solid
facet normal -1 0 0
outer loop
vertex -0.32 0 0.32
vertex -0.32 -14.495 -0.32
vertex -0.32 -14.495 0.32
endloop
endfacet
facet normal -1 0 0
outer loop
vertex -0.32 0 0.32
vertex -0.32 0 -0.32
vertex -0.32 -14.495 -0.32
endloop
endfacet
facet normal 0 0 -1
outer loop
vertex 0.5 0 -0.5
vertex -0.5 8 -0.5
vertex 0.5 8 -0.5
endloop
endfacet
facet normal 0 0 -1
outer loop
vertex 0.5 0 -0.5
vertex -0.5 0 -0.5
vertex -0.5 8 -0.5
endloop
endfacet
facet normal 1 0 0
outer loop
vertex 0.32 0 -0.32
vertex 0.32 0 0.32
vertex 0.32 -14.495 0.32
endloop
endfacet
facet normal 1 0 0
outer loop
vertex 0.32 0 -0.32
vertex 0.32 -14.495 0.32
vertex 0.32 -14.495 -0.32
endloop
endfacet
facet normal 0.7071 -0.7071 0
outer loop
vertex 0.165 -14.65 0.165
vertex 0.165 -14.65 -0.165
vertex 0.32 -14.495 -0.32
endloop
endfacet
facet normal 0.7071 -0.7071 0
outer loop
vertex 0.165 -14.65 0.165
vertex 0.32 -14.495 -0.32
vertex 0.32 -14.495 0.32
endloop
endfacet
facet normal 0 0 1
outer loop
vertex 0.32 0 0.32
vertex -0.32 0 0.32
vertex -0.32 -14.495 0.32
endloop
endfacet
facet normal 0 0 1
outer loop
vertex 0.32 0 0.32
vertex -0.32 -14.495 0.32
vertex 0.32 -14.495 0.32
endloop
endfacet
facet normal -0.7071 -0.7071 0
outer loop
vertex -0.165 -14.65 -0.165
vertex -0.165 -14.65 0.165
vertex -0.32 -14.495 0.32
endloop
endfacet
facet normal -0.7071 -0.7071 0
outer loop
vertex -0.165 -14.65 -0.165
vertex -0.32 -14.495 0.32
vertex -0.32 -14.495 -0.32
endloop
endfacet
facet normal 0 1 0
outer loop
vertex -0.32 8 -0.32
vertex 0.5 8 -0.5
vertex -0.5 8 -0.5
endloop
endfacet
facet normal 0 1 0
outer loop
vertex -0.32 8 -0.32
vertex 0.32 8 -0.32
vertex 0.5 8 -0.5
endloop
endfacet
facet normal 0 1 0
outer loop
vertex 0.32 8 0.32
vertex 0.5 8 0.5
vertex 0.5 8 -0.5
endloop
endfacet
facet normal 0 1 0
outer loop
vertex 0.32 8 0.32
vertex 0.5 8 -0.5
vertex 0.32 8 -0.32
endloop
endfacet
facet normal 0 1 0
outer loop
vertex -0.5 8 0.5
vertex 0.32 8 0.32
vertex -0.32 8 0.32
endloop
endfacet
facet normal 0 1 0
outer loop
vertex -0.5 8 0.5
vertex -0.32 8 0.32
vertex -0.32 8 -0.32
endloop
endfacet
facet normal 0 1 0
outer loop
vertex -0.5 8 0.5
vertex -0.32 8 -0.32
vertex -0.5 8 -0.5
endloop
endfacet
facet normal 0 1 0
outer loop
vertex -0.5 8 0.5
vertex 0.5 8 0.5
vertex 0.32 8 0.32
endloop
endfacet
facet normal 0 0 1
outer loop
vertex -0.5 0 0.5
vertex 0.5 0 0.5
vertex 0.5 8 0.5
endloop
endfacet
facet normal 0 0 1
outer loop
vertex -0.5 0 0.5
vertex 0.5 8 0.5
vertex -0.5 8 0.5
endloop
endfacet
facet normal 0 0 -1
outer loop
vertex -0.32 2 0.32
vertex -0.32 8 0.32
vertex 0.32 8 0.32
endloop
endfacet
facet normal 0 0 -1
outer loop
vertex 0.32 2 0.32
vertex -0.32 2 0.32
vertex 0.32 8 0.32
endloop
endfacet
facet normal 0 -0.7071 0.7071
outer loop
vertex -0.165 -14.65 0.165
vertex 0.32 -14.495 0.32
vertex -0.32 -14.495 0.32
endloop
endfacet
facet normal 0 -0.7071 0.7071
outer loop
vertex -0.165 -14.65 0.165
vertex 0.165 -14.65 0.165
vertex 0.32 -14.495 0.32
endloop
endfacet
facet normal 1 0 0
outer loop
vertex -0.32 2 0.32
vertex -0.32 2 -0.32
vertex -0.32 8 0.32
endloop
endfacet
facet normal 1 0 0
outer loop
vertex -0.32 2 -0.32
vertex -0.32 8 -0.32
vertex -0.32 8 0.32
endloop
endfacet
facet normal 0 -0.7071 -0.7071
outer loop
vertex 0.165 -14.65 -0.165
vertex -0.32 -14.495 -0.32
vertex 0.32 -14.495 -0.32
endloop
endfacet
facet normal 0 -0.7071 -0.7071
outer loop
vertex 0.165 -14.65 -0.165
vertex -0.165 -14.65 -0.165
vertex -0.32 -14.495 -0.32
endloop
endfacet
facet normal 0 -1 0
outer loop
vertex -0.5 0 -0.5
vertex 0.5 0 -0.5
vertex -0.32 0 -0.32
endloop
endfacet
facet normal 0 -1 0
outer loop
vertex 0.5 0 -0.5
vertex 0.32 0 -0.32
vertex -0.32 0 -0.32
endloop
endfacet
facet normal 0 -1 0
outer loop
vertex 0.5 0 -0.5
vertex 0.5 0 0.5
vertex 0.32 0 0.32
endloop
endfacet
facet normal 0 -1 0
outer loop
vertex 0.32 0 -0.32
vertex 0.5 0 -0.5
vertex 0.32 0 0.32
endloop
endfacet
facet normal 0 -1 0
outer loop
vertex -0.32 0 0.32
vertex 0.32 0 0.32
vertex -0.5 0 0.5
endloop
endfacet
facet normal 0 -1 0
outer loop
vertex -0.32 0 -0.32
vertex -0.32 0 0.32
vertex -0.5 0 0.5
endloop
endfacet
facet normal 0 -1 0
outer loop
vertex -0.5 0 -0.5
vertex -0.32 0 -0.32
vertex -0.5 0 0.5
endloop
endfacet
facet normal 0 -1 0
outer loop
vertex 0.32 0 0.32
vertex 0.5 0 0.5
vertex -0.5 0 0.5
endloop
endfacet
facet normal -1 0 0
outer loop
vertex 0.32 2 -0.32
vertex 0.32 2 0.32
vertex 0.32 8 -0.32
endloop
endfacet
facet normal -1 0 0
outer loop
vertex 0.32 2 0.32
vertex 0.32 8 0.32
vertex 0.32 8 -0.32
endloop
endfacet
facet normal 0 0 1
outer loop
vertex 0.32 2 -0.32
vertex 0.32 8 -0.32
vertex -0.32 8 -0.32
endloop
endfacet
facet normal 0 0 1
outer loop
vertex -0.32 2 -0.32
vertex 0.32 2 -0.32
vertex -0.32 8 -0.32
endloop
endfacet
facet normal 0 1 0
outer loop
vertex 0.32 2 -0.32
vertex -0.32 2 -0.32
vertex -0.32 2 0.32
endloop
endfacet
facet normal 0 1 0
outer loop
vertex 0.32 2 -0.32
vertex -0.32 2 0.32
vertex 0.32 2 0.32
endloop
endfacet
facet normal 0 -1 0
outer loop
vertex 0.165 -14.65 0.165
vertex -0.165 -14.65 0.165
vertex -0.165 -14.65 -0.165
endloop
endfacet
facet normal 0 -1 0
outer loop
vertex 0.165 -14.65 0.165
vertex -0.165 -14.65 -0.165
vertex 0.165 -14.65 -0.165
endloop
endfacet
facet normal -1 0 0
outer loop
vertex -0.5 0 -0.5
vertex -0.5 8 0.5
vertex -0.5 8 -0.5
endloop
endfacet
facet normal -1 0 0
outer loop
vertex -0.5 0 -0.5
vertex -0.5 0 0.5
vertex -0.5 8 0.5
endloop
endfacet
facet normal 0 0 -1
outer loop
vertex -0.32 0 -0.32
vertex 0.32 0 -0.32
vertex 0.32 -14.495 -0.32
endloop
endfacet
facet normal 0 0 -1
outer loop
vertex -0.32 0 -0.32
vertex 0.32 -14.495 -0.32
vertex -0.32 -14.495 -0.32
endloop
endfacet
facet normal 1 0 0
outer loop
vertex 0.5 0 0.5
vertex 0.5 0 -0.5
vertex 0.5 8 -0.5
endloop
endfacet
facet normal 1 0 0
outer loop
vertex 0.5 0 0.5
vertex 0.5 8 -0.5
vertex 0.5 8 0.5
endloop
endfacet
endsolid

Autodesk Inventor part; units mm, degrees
ref_plane "YZ Plane" through (0, 0, 0) normal (1, 0, 0) x (0, 1, 0)
ref_plane "XZ Plane" through (0, 0, 0) normal (0, 1, 0) x (-1, 0, 0)
ref_plane "XY Plane" through (0, 0, 0) normal (0, 0, 1) x (1, 0, 0)
sketch "Sketch1" plane through (0, 0, 0) normal (0, 1, 0) x (-1, 0, 0)
  line L0 (-0.5, 0.5) -> (0.5, 0.5)
  line L1 (0.5, 0.5) -> (0.5, -0.5)
  line L2 (0.5, -0.5) -> (-0.5, -0.5)
  line L3 (-0.5, -0.5) -> (-0.5, 0.5)
  line L4 (-0.5, 0.5) -> (0.5, -0.5) construction
  line L5 (0.5, 0.5) -> (-0.5, -0.5) construction
  point P0 (0, 0)
  dimension "d0" = 1
  dimension "d1" = 1
extrude "Extrusion1" add sketch "Sketch1" along normal blind 8
sketch "Sketch2" plane through (0, 0, 0) normal (0, -1, 0) x (1, 0, 0)
  line L0 (-0.32, 0.32) -> (0.32, 0.32)
  line L1 (0.32, 0.32) -> (0.32, -0.32)
  line L2 (0.32, -0.32) -> (-0.32, -0.32)
  line L3 (-0.32, -0.32) -> (-0.32, 0.32)
  line L4 (-0.32, 0.32) -> (0.32, -0.32) construction
  line L5 (0.32, 0.32) -> (-0.32, -0.32) construction
  point P0 (0, 0)
  dimension "d4" = 0.64
  dimension "d5" = 0.64
extrude "Extrusion2" add sketch "Sketch2" along normal blind 14.65
chamfer "Chamfer1" distance 0.155 angle 45 4 edges at (0, -14.65, 0.32) (0.32, -14.65, 0) (0, -14.65, -0.32) (-0.32, -14.65, 0)
sketch "Sketch3" plane through (0, 8, 0) normal (0, 1, 0) x (1, 0, 0)
  line L0 (0.32, 0.32) -> (-0.32, 0.32)
  line L1 (-0.32, 0.32) -> (-0.32, -0.32)
  line L2 (-0.32, -0.32) -> (0.32, -0.32)
  line L3 (0.32, -0.32) -> (0.32, 0.32)
  line L4 (0.32, 0.32) -> (-0.32, -0.32) construction
  line L5 (-0.32, 0.32) -> (0.32, -0.32) construction
  point P0 (0, 0)
  dimension "d11" = 0.64
  dimension "d12" = 0.64
extrude "Extrusion3" cut sketch "Sketch3" against normal blind 6
properties part number "pin" material "Gold"
